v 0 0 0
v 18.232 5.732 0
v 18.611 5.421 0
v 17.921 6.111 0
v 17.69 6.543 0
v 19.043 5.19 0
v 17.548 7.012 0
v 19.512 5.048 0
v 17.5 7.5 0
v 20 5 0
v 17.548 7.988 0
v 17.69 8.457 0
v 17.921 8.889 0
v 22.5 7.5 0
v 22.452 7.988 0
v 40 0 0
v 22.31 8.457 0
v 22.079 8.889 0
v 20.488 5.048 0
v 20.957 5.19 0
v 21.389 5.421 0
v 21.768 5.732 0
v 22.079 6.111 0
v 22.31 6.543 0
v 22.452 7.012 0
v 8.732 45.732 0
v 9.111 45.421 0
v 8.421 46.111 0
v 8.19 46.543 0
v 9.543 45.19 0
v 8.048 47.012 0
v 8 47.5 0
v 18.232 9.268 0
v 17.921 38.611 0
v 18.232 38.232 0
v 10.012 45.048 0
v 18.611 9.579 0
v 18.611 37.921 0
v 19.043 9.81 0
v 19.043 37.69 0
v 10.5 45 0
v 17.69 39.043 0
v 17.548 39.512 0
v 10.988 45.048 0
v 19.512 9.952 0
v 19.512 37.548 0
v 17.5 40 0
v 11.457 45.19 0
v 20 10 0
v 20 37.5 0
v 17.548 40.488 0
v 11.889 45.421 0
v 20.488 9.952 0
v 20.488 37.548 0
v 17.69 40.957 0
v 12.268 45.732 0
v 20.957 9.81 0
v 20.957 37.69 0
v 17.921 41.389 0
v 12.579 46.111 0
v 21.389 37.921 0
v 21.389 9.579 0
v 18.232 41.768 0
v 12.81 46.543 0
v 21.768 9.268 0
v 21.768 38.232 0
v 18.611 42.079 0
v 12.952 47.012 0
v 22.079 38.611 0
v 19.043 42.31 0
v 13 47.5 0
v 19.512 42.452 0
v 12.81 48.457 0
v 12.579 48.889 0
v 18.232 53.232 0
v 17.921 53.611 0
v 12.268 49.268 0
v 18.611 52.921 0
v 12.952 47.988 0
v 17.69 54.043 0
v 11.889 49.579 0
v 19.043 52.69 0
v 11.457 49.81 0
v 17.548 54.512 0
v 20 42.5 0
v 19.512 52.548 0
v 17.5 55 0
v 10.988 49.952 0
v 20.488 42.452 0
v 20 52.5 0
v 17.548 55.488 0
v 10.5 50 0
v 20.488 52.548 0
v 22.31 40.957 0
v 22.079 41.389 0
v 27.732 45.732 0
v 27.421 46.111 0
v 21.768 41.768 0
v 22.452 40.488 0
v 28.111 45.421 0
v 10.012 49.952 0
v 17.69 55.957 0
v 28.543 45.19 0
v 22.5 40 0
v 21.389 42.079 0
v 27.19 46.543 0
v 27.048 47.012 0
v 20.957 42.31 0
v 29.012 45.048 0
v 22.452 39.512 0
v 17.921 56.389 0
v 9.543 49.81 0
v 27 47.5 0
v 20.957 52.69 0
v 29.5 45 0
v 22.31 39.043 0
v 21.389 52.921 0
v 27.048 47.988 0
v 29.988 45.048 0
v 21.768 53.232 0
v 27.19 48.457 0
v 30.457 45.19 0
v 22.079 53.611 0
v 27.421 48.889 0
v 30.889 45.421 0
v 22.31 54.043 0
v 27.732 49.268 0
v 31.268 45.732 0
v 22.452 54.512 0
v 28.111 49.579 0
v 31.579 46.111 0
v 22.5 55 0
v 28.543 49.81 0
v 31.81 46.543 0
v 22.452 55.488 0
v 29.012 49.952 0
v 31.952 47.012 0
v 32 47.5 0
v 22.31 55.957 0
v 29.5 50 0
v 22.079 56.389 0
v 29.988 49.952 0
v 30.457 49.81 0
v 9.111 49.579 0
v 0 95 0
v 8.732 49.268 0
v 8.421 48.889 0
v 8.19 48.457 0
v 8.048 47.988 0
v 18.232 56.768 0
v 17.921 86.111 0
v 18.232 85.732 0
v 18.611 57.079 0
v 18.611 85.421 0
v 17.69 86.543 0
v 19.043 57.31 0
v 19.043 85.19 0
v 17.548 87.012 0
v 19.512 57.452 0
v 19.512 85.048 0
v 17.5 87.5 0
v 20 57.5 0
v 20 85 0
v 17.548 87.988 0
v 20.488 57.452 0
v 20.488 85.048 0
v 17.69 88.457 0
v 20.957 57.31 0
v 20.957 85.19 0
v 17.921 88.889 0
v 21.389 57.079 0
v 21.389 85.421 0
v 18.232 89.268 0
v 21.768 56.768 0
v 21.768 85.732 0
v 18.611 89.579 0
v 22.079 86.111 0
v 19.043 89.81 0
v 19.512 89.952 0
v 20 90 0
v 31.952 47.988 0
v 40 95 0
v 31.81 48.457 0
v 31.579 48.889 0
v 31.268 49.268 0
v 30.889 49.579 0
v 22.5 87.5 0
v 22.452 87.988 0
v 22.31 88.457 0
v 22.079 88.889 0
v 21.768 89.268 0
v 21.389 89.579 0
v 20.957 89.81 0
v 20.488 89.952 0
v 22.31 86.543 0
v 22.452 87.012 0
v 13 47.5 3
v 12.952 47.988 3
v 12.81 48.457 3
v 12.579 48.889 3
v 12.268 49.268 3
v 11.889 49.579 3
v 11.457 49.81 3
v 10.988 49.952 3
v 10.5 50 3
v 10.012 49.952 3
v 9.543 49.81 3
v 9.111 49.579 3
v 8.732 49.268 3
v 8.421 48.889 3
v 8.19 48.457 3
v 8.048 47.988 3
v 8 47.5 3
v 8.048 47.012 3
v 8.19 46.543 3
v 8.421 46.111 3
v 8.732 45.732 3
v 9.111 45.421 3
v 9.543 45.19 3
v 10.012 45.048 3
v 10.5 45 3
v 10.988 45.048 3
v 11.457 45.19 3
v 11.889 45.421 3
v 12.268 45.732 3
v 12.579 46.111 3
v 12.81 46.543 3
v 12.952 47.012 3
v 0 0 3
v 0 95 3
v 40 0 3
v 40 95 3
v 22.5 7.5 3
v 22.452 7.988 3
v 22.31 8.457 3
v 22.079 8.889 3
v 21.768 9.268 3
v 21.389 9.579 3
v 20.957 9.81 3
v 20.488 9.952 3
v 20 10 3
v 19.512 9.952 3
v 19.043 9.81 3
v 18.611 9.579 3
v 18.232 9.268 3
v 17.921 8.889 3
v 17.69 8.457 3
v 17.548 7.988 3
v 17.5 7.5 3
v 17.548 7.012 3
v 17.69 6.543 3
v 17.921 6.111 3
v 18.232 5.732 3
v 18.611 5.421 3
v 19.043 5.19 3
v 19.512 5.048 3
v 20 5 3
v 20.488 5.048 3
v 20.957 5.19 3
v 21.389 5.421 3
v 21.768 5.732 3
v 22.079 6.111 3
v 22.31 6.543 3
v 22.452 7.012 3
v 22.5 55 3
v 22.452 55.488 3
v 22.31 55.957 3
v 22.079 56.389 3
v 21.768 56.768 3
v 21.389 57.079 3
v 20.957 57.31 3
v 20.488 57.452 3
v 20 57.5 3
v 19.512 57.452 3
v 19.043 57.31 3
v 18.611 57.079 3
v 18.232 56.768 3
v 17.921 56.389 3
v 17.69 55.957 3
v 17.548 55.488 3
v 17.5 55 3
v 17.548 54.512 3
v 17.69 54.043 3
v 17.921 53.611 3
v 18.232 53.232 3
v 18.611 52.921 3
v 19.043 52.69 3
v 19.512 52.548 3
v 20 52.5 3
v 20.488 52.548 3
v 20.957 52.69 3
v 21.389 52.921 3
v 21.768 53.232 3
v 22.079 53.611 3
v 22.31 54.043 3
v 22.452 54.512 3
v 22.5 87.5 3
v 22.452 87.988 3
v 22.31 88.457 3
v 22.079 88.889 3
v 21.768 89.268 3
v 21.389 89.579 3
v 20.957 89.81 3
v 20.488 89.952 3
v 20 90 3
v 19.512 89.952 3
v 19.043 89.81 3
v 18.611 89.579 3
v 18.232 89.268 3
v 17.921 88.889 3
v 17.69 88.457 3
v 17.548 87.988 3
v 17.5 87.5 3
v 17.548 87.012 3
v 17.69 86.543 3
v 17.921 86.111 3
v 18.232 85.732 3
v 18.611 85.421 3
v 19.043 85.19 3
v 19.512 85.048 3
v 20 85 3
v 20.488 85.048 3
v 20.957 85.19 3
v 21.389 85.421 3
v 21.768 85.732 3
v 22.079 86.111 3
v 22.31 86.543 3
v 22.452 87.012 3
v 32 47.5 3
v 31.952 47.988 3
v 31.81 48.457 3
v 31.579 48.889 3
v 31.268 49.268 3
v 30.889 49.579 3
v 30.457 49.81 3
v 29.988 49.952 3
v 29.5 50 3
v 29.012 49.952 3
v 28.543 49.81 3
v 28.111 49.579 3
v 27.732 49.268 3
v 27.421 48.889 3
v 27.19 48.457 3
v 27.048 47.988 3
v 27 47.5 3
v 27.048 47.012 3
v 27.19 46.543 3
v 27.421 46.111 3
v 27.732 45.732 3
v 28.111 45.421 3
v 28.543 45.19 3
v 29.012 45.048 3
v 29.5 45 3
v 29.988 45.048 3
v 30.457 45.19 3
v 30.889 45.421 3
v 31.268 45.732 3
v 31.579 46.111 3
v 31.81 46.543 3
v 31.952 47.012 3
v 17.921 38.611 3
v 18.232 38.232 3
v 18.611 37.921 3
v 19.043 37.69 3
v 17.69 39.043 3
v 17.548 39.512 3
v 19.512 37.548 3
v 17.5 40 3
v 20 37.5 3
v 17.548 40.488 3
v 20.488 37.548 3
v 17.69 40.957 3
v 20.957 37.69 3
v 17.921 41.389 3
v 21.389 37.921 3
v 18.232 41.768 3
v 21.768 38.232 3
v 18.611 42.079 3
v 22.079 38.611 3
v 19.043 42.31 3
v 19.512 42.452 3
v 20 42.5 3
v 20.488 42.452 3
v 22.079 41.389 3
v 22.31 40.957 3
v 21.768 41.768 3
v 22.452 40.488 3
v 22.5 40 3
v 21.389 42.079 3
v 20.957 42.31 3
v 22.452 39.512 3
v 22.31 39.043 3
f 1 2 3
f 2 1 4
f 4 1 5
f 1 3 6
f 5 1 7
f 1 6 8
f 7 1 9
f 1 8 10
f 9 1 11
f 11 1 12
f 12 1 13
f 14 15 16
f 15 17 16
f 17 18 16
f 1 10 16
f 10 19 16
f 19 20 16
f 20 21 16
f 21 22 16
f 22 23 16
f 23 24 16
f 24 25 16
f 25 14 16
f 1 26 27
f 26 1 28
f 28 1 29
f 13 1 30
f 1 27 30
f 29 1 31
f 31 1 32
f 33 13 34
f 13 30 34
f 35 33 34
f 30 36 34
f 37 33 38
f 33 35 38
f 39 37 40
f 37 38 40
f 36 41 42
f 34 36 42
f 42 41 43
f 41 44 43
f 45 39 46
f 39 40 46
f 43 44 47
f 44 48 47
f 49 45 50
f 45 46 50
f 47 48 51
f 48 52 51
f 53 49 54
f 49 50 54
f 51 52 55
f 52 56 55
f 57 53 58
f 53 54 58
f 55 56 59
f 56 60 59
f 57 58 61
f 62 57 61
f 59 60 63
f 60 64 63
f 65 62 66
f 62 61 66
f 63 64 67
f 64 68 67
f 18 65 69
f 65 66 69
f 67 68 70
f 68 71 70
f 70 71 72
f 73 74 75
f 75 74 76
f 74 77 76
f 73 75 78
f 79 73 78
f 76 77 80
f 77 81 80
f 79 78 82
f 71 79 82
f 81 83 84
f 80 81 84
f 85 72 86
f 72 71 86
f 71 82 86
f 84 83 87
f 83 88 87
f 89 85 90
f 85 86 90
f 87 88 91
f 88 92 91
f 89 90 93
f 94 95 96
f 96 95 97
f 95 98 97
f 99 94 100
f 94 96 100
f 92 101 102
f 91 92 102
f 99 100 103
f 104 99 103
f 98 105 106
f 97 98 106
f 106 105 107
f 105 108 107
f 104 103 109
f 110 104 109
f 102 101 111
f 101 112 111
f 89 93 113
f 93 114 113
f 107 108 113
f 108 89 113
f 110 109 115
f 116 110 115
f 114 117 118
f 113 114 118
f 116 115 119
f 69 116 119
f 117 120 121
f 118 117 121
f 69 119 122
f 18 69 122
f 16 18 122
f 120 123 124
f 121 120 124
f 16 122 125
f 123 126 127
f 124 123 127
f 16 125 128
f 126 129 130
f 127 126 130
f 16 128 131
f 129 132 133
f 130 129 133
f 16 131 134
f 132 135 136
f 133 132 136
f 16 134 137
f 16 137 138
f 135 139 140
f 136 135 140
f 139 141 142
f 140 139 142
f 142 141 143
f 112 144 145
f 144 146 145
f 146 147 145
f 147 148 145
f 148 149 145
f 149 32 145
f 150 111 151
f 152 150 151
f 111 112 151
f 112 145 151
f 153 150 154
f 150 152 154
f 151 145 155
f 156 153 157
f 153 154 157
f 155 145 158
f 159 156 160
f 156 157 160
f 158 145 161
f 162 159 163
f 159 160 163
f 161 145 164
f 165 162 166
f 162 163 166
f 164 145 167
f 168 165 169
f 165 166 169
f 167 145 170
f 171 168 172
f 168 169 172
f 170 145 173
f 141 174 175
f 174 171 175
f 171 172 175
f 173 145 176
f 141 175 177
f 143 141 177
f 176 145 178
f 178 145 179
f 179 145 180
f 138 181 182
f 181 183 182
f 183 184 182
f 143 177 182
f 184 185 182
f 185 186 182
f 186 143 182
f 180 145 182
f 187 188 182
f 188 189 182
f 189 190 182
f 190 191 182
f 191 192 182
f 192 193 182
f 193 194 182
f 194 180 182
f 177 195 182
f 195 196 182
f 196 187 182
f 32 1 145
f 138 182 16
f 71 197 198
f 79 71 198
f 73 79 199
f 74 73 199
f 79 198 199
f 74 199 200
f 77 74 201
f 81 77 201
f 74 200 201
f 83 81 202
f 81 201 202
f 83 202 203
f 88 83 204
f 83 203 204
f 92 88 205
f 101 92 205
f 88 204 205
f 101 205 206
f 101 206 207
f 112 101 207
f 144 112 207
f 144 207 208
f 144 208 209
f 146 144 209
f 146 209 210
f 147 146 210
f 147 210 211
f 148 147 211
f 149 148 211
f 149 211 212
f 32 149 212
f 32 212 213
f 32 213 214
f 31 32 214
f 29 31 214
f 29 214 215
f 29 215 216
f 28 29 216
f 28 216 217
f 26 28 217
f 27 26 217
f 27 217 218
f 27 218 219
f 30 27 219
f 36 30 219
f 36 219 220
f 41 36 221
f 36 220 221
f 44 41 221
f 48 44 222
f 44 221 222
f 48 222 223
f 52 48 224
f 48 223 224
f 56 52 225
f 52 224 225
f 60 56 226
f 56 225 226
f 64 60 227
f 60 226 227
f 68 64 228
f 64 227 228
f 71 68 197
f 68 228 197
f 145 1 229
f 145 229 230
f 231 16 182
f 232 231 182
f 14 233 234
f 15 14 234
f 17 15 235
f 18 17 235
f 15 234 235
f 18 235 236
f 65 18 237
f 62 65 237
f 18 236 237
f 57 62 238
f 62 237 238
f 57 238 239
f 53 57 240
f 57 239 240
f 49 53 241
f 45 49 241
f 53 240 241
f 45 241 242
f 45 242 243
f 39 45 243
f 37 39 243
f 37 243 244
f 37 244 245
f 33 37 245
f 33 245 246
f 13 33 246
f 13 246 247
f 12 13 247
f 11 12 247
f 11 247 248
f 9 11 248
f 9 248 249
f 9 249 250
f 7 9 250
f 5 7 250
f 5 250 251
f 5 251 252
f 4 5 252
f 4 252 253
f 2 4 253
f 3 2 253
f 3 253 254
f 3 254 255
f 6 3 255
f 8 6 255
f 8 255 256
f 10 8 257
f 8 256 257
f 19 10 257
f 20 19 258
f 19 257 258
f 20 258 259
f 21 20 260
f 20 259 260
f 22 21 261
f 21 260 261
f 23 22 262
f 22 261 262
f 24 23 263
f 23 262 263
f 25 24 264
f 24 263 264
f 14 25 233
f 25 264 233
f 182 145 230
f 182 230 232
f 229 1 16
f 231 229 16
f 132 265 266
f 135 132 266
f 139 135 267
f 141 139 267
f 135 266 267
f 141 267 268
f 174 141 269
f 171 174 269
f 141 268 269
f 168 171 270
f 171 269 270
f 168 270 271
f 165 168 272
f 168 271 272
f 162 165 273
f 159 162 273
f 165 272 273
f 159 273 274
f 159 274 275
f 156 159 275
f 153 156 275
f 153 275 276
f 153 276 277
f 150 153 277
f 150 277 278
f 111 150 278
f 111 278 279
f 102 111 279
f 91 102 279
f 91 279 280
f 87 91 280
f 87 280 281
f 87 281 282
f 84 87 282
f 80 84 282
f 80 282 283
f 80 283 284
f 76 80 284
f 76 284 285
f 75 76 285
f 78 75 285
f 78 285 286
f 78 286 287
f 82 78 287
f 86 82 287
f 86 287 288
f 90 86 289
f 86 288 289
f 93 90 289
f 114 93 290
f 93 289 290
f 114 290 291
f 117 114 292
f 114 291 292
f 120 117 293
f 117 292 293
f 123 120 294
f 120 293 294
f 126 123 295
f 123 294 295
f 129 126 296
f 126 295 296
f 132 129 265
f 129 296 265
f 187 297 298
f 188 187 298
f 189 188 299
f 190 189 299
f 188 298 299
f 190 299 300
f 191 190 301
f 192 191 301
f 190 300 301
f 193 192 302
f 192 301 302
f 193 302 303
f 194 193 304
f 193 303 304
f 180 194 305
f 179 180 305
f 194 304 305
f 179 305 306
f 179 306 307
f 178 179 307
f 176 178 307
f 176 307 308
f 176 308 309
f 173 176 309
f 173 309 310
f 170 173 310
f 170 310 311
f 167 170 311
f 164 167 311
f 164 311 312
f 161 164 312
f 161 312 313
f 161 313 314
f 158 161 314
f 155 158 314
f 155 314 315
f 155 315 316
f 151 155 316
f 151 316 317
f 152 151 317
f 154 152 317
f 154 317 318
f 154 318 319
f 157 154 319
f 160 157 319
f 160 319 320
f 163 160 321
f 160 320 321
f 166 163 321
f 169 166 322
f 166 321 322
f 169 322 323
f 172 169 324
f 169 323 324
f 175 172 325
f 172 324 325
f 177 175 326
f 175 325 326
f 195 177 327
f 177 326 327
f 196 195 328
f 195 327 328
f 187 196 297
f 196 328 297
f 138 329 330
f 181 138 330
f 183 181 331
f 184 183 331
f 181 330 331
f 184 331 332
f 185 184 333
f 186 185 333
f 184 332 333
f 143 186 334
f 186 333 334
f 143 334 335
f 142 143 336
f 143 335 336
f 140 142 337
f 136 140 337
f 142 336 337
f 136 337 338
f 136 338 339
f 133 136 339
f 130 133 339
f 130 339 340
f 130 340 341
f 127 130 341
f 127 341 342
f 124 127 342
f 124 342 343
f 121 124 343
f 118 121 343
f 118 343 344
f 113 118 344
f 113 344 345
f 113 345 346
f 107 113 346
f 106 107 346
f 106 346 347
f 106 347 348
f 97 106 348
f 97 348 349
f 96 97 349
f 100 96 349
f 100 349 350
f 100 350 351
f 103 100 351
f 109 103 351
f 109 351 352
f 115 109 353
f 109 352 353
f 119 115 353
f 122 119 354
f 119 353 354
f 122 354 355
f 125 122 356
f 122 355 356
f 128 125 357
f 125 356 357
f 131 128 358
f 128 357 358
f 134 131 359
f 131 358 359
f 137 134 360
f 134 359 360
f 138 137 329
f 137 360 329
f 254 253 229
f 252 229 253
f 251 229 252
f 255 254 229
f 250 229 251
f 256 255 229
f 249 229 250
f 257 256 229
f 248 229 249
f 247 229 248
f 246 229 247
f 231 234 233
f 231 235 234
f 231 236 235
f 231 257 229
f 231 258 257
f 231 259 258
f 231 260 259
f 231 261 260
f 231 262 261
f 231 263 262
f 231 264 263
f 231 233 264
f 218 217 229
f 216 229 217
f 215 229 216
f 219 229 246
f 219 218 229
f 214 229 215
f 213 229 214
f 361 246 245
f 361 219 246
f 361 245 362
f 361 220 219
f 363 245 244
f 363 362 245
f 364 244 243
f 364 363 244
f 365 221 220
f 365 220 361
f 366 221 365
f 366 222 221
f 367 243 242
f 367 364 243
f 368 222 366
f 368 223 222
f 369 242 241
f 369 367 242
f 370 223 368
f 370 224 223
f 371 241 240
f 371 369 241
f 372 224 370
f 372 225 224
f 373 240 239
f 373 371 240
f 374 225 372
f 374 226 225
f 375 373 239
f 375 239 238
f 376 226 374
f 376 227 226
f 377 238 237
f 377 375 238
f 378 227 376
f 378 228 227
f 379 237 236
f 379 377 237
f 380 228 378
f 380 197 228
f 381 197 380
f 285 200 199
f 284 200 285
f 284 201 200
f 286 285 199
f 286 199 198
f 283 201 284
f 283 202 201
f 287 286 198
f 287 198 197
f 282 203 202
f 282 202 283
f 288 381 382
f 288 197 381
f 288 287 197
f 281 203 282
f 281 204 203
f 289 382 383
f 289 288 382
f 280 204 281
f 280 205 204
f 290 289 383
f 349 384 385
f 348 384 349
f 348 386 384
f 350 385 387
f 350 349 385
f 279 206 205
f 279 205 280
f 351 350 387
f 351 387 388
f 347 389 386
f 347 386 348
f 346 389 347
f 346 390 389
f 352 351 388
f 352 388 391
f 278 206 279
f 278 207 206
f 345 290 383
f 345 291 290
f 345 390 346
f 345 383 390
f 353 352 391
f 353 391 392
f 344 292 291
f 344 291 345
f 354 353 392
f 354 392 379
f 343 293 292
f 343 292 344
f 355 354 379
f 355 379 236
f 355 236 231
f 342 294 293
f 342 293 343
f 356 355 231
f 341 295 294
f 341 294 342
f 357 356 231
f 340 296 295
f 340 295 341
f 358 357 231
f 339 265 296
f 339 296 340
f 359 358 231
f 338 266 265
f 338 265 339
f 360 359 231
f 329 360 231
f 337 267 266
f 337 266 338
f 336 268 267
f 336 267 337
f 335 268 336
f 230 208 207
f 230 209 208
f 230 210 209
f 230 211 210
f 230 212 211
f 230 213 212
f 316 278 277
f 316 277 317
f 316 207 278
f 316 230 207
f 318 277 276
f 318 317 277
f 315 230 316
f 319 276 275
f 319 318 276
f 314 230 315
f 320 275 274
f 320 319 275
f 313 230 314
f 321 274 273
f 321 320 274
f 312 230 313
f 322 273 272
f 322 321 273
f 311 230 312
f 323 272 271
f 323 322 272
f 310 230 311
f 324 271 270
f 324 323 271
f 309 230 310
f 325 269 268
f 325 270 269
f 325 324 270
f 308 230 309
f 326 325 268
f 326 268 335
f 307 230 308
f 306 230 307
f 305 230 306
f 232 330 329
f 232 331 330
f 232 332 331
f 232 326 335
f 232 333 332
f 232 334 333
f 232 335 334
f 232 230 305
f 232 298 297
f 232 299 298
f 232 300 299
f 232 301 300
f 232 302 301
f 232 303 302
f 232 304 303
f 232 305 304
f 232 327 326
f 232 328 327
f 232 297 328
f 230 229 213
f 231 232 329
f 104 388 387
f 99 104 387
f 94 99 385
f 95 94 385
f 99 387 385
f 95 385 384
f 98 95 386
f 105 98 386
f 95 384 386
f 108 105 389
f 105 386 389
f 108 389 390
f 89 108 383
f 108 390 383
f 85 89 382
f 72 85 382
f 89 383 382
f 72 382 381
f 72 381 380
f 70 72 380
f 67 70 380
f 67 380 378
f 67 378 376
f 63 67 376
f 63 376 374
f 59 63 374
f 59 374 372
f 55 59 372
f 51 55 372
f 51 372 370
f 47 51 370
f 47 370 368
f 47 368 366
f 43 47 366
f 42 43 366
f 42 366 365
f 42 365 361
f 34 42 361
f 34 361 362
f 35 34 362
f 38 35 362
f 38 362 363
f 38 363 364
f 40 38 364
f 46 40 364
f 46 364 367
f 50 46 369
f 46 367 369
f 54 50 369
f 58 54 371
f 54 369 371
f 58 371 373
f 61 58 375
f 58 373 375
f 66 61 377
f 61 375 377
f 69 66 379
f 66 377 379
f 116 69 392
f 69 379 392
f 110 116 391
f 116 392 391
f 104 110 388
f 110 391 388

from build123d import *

# Parameters (mm, degrees)
ESBO_O1_W                = 40
ESBO_O1_H                = 95
RESSALTO_EXTRUS_O1_DEPTH = 3
CUT_EXTRUDE1_REACH       = 105.121
ESBO_O2_R                = 2.5


with BuildPart() as part:
    # Esboço1 → Ressalto-extrusão1 (new body)
    with BuildSketch(Plane.XY):
        with Locations((20, 47.5)):
            Rectangle(ESBO_O1_W, ESBO_O1_H)
    extrude(amount=RESSALTO_EXTRUS_O1_DEPTH)

    # Esboço2 → Cut-Extrude1 (cut, up to next)
    with BuildSketch(Plane.XY.offset(3), mode=Mode.PRIVATE) as cut_extrude1_sk1:
        with Locations((20, 87.5)):
            Circle(ESBO_O2_R)
    cut_extrude1_tool1 = extrude(cut_extrude1_sk1.sketch, amount=-CUT_EXTRUDE1_REACH, mode=Mode.PRIVATE) & part.part
    # Esboço2 → Cut-Extrude1 (cut, up to next)
    with BuildSketch(Plane.XY.offset(3), mode=Mode.PRIVATE) as cut_extrude1_sk2:
        with Locations((20, 7.5)):
            Circle(ESBO_O2_R)
    cut_extrude1_tool2 = extrude(cut_extrude1_sk2.sketch, amount=-CUT_EXTRUDE1_REACH, mode=Mode.PRIVATE) & part.part
    # Esboço2 → Cut-Extrude1 (cut, up to next)
    with BuildSketch(Plane.XY.offset(3), mode=Mode.PRIVATE) as cut_extrude1_sk3:
        with Locations((10.5, 47.5)):
            Circle(ESBO_O2_R)
    cut_extrude1_tool3 = extrude(cut_extrude1_sk3.sketch, amount=-CUT_EXTRUDE1_REACH, mode=Mode.PRIVATE) & part.part
    # Esboço2 → Cut-Extrude1 (cut, up to next)
    with BuildSketch(Plane.XY.offset(3), mode=Mode.PRIVATE) as cut_extrude1_sk4:
        with Locations((29.5, 47.5)):
            Circle(ESBO_O2_R)
    cut_extrude1_tool4 = extrude(cut_extrude1_sk4.sketch, amount=-CUT_EXTRUDE1_REACH, mode=Mode.PRIVATE) & part.part
    # Esboço2 → Cut-Extrude1 (cut, up to next)
    with BuildSketch(Plane.XY.offset(3), mode=Mode.PRIVATE) as cut_extrude1_sk5:
        with Locations((20, 55)):
            Circle(ESBO_O2_R)
    cut_extrude1_tool5 = extrude(cut_extrude1_sk5.sketch, amount=-CUT_EXTRUDE1_REACH, mode=Mode.PRIVATE) & part.part
    # Esboço2 → Cut-Extrude1 (cut, up to next)
    with BuildSketch(Plane.XY.offset(3), mode=Mode.PRIVATE) as cut_extrude1_sk6:
        with Locations((20, 40)):
            Circle(ESBO_O2_R)
    cut_extrude1_tool6 = extrude(cut_extrude1_sk6.sketch, amount=-CUT_EXTRUDE1_REACH, mode=Mode.PRIVATE) & part.part
    add(cut_extrude1_tool1.solids().sort_by_distance((20, 87.5, 3))[0], mode=Mode.SUBTRACT)
    add(cut_extrude1_tool2.solids().sort_by_distance((20, 7.5, 3))[0], mode=Mode.SUBTRACT)
    add(cut_extrude1_tool3.solids().sort_by_distance((10.5, 47.5, 3))[0], mode=Mode.SUBTRACT)
    add(cut_extrude1_tool4.solids().sort_by_distance((29.5, 47.5, 3))[0], mode=Mode.SUBTRACT)
    add(cut_extrude1_tool5.solids().sort_by_distance((20, 55, 3))[0], mode=Mode.SUBTRACT)
    add(cut_extrude1_tool6.solids().sort_by_distance((20, 40, 3))[0], mode=Mode.SUBTRACT)


solid = part.part
